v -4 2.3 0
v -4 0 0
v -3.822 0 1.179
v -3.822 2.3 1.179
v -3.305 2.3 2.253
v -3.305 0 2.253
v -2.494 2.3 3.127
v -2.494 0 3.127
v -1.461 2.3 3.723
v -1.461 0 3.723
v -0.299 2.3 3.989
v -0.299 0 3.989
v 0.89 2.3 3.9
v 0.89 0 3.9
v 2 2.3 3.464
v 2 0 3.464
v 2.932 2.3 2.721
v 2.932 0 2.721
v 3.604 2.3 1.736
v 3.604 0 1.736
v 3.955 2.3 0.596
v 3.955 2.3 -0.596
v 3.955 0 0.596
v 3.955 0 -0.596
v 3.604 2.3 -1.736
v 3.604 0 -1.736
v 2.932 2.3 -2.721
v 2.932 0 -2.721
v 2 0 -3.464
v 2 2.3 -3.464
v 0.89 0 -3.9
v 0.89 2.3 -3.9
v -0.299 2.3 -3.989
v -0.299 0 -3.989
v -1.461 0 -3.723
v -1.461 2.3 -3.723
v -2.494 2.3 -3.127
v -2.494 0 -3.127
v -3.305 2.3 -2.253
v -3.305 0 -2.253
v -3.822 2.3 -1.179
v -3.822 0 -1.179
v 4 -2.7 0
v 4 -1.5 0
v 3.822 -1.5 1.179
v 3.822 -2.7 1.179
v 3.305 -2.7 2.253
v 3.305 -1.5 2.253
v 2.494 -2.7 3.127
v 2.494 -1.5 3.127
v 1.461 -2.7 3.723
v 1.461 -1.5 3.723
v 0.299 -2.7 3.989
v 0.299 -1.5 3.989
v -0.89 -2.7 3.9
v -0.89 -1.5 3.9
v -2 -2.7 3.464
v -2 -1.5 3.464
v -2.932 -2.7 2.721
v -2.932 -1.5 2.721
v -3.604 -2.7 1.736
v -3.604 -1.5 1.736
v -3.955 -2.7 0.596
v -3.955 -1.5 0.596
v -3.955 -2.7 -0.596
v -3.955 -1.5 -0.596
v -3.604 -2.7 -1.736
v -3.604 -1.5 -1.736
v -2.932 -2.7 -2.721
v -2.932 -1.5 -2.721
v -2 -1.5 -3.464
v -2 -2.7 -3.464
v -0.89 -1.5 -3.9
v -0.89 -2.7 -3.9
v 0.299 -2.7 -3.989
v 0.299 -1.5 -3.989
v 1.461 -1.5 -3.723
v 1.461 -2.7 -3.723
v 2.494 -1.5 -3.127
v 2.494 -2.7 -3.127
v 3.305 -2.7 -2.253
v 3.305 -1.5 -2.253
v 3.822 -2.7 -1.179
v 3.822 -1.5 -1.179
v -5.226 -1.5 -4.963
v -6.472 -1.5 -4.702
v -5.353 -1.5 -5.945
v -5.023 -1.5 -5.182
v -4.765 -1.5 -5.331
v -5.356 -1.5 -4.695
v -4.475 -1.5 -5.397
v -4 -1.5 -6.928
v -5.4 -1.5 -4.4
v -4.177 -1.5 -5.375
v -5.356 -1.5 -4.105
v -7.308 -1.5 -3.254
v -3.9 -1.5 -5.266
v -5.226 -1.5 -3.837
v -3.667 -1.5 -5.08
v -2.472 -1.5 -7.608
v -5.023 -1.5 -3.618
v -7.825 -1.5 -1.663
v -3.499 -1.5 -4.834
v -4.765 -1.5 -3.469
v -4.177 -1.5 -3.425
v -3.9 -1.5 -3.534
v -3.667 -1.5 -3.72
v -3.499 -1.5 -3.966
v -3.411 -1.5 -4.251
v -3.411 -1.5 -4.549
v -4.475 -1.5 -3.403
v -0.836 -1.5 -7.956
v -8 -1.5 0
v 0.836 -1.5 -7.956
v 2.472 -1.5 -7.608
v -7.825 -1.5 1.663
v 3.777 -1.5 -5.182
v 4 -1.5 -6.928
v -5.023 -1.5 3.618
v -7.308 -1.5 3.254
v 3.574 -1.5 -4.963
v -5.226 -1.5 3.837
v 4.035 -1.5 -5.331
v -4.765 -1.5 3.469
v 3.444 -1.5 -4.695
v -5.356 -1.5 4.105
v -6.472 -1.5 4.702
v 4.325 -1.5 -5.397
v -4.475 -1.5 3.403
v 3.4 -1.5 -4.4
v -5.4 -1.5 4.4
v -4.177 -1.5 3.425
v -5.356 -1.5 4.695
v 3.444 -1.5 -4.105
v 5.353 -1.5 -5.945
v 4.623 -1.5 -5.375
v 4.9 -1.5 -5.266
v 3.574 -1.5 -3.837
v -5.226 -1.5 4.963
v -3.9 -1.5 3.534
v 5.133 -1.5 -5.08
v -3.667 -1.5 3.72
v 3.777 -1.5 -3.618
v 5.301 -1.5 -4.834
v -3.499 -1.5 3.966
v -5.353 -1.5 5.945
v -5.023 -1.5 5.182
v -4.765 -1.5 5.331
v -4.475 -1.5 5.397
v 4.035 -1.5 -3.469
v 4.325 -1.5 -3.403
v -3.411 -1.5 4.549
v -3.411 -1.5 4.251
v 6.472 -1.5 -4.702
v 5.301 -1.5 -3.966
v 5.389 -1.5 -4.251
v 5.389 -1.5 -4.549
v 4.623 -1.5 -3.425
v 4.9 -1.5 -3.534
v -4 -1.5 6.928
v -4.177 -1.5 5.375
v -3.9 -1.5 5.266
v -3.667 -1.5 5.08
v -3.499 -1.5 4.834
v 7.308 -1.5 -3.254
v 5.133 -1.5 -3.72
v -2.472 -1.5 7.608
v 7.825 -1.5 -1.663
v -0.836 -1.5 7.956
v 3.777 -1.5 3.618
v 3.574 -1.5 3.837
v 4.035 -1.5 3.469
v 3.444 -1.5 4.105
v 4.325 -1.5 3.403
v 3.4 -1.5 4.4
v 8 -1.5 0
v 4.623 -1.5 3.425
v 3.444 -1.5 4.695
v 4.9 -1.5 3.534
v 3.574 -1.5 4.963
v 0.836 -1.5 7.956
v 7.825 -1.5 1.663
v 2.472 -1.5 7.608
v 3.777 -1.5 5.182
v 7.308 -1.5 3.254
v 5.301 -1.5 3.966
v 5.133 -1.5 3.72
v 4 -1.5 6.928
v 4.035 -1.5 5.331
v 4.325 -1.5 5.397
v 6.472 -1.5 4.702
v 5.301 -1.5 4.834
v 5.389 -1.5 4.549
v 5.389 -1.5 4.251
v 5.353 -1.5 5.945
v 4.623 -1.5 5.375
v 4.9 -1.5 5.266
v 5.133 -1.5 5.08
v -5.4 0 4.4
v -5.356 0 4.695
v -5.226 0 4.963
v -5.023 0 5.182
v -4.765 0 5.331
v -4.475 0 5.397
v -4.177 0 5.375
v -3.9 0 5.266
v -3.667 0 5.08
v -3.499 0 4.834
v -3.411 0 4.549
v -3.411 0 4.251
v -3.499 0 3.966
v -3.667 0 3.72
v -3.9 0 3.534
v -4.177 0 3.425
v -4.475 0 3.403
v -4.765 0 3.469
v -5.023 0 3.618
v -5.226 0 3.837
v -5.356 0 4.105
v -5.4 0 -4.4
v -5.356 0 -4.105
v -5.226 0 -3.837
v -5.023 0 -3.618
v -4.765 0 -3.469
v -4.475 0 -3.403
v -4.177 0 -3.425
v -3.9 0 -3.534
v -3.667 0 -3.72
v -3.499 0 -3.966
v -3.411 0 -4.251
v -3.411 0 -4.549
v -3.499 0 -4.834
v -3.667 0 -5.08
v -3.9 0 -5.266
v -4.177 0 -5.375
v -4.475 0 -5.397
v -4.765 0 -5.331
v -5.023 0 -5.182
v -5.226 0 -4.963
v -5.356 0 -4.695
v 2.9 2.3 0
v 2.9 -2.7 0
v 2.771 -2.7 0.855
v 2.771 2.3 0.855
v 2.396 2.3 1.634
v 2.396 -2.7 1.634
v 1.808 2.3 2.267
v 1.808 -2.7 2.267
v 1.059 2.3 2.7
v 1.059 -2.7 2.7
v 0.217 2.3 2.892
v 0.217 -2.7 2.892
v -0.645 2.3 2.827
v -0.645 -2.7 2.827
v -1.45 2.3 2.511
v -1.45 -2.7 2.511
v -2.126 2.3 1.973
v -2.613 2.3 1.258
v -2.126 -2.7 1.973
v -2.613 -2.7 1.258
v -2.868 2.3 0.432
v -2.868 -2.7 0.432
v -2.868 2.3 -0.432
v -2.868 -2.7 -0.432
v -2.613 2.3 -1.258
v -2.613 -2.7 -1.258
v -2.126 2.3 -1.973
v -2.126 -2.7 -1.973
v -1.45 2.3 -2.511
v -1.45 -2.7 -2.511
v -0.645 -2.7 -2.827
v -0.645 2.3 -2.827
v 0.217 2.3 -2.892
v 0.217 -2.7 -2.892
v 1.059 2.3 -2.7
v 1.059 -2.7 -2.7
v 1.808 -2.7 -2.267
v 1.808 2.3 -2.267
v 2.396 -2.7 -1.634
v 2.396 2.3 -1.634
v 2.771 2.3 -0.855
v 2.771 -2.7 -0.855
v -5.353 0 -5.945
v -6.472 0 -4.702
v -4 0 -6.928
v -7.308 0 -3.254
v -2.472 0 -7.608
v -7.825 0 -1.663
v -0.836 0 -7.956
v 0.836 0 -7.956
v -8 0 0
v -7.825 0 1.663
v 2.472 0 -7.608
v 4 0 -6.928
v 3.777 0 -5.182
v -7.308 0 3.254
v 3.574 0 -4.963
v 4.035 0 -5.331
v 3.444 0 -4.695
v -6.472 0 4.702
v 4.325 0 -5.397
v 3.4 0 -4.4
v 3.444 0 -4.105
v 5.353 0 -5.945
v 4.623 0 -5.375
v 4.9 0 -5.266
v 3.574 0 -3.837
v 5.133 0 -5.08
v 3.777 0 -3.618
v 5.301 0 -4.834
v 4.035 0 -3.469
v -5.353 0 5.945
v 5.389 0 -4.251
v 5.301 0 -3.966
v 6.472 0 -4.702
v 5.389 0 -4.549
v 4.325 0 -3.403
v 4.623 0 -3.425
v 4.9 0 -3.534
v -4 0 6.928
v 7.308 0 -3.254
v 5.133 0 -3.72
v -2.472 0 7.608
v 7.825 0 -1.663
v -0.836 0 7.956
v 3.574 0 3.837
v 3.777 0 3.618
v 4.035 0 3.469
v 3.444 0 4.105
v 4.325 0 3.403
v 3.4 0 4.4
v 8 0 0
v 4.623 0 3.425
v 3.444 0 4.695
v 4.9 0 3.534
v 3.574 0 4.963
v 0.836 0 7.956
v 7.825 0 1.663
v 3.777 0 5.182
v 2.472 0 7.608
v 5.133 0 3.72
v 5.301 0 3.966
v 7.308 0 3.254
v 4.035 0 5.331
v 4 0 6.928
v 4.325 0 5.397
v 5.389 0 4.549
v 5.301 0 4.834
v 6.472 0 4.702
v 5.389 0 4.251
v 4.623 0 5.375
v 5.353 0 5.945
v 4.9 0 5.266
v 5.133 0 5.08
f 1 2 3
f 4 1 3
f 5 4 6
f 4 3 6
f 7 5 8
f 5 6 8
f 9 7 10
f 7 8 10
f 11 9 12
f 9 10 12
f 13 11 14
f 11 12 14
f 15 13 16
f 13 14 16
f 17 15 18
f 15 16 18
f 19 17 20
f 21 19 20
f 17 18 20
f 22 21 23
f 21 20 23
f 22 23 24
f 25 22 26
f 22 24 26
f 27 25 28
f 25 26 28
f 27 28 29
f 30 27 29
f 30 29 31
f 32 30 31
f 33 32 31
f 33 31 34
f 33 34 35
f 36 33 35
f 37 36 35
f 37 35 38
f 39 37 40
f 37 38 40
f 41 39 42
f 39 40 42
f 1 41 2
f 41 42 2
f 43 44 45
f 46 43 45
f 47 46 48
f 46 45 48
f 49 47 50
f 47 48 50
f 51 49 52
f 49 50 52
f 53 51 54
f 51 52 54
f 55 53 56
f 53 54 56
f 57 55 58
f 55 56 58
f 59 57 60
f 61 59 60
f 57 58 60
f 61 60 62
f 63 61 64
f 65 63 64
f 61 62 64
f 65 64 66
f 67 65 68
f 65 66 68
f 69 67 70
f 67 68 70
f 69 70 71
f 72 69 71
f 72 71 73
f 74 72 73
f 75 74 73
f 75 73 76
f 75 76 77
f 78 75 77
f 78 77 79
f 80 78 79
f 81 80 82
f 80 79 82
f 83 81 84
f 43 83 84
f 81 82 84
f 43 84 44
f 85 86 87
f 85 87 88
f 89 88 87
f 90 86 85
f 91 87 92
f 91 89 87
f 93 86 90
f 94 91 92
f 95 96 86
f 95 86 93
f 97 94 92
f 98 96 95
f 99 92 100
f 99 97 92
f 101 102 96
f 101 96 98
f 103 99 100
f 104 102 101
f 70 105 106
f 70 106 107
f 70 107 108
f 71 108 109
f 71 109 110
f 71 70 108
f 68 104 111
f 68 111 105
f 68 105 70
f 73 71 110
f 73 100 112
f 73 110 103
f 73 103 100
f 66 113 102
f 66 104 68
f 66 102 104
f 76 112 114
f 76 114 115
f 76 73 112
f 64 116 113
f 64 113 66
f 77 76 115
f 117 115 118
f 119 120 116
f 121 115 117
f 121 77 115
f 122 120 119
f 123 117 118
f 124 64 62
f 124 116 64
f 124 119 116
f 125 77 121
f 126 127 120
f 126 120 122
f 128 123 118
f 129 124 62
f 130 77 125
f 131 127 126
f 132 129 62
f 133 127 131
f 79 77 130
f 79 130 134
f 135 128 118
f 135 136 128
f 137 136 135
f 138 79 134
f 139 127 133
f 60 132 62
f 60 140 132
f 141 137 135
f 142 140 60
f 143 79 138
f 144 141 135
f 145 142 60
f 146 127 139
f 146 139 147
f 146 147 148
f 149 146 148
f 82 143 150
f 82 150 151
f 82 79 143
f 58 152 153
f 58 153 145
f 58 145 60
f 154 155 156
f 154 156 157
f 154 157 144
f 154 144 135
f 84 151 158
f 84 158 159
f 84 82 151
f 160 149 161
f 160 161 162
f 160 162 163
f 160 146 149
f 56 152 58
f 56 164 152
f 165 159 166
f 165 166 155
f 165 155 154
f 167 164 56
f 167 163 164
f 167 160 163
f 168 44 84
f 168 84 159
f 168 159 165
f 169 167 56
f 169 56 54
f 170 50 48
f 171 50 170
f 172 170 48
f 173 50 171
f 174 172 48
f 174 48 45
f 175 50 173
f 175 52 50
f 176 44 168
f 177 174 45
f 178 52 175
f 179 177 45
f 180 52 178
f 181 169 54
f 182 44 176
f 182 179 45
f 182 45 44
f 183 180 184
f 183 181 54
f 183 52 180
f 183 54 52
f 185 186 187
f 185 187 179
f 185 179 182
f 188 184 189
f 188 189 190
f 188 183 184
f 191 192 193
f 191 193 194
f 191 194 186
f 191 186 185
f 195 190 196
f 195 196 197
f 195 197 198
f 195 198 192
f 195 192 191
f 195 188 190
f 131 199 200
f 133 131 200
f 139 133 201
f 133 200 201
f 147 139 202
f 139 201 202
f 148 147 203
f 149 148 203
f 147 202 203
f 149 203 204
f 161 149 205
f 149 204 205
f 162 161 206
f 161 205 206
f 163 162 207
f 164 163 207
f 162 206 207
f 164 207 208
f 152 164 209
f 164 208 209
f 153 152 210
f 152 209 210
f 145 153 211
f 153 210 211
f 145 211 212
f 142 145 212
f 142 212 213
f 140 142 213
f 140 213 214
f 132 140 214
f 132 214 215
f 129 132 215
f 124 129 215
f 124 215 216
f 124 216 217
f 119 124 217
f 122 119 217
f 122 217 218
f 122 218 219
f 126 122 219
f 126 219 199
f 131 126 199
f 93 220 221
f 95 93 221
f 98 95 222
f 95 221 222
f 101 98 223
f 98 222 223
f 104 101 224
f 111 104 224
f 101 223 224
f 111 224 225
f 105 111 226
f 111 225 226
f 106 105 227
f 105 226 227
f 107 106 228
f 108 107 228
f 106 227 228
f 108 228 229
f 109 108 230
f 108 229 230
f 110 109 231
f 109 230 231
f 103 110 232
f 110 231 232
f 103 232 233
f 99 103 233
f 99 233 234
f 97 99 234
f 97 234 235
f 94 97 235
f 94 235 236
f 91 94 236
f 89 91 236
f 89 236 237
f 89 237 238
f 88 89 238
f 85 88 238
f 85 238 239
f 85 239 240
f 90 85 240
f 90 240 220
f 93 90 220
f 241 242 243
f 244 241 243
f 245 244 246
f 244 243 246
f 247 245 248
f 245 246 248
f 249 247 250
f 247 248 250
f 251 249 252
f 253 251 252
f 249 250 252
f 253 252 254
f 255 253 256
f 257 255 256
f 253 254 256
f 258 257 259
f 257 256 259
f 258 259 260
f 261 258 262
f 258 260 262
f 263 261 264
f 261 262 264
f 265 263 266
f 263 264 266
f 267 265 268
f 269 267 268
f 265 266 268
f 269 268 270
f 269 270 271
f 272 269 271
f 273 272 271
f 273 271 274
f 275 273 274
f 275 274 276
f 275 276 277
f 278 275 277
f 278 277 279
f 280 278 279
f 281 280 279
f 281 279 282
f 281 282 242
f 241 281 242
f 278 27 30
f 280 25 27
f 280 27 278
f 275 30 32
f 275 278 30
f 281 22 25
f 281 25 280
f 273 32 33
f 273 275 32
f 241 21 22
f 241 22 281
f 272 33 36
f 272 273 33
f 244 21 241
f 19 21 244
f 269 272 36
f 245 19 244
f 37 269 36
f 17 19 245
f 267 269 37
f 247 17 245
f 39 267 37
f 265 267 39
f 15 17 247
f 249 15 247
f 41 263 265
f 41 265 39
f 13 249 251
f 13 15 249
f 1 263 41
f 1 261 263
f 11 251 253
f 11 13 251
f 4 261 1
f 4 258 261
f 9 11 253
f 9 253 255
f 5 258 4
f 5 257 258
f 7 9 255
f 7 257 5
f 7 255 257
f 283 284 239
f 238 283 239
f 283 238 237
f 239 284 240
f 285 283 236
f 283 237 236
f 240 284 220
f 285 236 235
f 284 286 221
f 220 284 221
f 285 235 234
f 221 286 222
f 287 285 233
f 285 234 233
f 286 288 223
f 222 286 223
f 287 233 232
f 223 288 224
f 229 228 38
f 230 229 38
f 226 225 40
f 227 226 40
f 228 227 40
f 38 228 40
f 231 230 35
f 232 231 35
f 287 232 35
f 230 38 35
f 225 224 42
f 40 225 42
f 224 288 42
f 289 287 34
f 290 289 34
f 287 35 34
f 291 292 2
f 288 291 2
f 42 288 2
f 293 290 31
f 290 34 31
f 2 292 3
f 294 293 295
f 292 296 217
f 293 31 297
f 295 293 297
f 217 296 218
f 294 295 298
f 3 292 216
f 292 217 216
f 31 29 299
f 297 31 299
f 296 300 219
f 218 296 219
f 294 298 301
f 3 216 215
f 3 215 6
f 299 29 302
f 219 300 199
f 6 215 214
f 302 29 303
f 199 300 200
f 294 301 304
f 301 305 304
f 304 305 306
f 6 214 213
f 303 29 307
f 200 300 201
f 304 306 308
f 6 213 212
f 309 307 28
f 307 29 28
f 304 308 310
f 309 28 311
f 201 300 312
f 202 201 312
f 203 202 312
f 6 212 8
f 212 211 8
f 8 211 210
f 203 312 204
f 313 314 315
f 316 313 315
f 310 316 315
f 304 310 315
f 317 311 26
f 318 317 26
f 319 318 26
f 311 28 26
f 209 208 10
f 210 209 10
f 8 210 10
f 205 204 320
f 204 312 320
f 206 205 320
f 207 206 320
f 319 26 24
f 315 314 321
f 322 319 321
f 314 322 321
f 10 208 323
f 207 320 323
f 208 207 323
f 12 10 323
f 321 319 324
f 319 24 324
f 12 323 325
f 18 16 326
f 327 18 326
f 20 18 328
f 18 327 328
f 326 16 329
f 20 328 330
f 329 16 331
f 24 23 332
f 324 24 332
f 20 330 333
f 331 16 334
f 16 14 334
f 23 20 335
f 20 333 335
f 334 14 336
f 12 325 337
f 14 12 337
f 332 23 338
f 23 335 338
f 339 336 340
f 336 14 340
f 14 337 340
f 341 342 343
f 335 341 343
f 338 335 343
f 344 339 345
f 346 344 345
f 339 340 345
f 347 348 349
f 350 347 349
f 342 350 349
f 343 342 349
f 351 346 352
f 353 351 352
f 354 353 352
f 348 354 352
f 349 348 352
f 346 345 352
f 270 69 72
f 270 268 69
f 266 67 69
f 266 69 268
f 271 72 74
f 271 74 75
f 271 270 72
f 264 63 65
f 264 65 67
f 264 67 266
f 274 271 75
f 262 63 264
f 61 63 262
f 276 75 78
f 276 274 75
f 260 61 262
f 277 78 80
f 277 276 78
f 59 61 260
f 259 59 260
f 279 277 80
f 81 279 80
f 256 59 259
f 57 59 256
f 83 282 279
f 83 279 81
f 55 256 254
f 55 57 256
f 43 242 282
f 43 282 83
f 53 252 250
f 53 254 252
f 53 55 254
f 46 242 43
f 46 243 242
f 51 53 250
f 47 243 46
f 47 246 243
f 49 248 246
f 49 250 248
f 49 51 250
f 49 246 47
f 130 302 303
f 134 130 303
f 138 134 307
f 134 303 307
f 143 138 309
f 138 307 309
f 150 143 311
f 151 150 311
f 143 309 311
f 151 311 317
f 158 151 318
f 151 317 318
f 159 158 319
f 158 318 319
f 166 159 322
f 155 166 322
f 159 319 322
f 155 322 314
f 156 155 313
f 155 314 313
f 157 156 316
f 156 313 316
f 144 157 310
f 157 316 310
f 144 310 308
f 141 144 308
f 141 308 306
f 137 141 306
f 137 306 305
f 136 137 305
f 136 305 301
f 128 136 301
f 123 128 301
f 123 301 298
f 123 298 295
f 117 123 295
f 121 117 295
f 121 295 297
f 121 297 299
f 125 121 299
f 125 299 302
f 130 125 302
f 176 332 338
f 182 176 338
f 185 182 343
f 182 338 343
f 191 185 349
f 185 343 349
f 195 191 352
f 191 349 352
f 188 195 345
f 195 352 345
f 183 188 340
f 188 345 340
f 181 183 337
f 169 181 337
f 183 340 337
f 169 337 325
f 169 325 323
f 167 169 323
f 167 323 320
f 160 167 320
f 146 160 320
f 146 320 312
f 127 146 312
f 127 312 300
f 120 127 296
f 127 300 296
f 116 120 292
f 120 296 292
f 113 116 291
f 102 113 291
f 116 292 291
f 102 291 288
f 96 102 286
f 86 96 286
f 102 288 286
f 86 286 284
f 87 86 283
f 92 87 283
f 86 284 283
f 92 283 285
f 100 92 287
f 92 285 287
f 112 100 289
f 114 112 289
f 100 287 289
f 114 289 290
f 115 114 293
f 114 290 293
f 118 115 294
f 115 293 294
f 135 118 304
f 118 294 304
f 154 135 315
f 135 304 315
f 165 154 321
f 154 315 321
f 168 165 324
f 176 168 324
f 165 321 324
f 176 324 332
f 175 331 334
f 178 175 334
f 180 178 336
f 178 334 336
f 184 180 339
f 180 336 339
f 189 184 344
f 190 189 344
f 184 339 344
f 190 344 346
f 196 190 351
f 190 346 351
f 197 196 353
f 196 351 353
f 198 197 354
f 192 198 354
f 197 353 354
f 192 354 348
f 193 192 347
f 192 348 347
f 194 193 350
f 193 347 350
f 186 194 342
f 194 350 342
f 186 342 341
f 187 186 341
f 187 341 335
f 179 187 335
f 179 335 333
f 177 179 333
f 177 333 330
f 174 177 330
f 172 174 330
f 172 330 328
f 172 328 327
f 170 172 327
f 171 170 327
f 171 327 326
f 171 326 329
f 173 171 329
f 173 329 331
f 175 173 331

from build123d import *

# Parameters (mm, degrees)
F0_R     = 8
F1_DEPTH = 1.5
F3_D     = 2
F4_R     = 4
F5_DEPTH = 1.2
F6_R     = 4
F7_DEPTH = 2.3
F9_D     = 5.8


with BuildPart() as f1:
    # F0 (on Front) → F1 (new body)
    with BuildSketch(Plane.XZ):
        Circle(F0_R)
    extrude(amount=F1_DEPTH)

    # F3 (through all)
    with Locations(Plane.XZ.offset(1.5)):
        with Locations((-4.4, 4.4), (4.4, 4.4), (4.4, -4.4), (-4.4, -4.4)):
            Hole(F3_D / 2)

    # F4 (on face) → F5 (join)
    with BuildSketch(Plane.XZ.offset(1.5)):
        Circle(F4_R)
    extrude(amount=F5_DEPTH)

    # F6 (on face) → F7 (join)
    with BuildSketch(Plane(origin=(0, 0, 0), x_dir=(-1, 0, 0), z_dir=(0, 1, 0))):
        Circle(F6_R)
    extrude(amount=F7_DEPTH)

    # F9 (through all)
    with Locations(Plane(origin=(0, 2.3, 0), x_dir=(-1, 0, 0), z_dir=(0, 1, 0))):
        with Locations((0, 0)):
            Hole(F9_D / 2)


solid = f1.part
